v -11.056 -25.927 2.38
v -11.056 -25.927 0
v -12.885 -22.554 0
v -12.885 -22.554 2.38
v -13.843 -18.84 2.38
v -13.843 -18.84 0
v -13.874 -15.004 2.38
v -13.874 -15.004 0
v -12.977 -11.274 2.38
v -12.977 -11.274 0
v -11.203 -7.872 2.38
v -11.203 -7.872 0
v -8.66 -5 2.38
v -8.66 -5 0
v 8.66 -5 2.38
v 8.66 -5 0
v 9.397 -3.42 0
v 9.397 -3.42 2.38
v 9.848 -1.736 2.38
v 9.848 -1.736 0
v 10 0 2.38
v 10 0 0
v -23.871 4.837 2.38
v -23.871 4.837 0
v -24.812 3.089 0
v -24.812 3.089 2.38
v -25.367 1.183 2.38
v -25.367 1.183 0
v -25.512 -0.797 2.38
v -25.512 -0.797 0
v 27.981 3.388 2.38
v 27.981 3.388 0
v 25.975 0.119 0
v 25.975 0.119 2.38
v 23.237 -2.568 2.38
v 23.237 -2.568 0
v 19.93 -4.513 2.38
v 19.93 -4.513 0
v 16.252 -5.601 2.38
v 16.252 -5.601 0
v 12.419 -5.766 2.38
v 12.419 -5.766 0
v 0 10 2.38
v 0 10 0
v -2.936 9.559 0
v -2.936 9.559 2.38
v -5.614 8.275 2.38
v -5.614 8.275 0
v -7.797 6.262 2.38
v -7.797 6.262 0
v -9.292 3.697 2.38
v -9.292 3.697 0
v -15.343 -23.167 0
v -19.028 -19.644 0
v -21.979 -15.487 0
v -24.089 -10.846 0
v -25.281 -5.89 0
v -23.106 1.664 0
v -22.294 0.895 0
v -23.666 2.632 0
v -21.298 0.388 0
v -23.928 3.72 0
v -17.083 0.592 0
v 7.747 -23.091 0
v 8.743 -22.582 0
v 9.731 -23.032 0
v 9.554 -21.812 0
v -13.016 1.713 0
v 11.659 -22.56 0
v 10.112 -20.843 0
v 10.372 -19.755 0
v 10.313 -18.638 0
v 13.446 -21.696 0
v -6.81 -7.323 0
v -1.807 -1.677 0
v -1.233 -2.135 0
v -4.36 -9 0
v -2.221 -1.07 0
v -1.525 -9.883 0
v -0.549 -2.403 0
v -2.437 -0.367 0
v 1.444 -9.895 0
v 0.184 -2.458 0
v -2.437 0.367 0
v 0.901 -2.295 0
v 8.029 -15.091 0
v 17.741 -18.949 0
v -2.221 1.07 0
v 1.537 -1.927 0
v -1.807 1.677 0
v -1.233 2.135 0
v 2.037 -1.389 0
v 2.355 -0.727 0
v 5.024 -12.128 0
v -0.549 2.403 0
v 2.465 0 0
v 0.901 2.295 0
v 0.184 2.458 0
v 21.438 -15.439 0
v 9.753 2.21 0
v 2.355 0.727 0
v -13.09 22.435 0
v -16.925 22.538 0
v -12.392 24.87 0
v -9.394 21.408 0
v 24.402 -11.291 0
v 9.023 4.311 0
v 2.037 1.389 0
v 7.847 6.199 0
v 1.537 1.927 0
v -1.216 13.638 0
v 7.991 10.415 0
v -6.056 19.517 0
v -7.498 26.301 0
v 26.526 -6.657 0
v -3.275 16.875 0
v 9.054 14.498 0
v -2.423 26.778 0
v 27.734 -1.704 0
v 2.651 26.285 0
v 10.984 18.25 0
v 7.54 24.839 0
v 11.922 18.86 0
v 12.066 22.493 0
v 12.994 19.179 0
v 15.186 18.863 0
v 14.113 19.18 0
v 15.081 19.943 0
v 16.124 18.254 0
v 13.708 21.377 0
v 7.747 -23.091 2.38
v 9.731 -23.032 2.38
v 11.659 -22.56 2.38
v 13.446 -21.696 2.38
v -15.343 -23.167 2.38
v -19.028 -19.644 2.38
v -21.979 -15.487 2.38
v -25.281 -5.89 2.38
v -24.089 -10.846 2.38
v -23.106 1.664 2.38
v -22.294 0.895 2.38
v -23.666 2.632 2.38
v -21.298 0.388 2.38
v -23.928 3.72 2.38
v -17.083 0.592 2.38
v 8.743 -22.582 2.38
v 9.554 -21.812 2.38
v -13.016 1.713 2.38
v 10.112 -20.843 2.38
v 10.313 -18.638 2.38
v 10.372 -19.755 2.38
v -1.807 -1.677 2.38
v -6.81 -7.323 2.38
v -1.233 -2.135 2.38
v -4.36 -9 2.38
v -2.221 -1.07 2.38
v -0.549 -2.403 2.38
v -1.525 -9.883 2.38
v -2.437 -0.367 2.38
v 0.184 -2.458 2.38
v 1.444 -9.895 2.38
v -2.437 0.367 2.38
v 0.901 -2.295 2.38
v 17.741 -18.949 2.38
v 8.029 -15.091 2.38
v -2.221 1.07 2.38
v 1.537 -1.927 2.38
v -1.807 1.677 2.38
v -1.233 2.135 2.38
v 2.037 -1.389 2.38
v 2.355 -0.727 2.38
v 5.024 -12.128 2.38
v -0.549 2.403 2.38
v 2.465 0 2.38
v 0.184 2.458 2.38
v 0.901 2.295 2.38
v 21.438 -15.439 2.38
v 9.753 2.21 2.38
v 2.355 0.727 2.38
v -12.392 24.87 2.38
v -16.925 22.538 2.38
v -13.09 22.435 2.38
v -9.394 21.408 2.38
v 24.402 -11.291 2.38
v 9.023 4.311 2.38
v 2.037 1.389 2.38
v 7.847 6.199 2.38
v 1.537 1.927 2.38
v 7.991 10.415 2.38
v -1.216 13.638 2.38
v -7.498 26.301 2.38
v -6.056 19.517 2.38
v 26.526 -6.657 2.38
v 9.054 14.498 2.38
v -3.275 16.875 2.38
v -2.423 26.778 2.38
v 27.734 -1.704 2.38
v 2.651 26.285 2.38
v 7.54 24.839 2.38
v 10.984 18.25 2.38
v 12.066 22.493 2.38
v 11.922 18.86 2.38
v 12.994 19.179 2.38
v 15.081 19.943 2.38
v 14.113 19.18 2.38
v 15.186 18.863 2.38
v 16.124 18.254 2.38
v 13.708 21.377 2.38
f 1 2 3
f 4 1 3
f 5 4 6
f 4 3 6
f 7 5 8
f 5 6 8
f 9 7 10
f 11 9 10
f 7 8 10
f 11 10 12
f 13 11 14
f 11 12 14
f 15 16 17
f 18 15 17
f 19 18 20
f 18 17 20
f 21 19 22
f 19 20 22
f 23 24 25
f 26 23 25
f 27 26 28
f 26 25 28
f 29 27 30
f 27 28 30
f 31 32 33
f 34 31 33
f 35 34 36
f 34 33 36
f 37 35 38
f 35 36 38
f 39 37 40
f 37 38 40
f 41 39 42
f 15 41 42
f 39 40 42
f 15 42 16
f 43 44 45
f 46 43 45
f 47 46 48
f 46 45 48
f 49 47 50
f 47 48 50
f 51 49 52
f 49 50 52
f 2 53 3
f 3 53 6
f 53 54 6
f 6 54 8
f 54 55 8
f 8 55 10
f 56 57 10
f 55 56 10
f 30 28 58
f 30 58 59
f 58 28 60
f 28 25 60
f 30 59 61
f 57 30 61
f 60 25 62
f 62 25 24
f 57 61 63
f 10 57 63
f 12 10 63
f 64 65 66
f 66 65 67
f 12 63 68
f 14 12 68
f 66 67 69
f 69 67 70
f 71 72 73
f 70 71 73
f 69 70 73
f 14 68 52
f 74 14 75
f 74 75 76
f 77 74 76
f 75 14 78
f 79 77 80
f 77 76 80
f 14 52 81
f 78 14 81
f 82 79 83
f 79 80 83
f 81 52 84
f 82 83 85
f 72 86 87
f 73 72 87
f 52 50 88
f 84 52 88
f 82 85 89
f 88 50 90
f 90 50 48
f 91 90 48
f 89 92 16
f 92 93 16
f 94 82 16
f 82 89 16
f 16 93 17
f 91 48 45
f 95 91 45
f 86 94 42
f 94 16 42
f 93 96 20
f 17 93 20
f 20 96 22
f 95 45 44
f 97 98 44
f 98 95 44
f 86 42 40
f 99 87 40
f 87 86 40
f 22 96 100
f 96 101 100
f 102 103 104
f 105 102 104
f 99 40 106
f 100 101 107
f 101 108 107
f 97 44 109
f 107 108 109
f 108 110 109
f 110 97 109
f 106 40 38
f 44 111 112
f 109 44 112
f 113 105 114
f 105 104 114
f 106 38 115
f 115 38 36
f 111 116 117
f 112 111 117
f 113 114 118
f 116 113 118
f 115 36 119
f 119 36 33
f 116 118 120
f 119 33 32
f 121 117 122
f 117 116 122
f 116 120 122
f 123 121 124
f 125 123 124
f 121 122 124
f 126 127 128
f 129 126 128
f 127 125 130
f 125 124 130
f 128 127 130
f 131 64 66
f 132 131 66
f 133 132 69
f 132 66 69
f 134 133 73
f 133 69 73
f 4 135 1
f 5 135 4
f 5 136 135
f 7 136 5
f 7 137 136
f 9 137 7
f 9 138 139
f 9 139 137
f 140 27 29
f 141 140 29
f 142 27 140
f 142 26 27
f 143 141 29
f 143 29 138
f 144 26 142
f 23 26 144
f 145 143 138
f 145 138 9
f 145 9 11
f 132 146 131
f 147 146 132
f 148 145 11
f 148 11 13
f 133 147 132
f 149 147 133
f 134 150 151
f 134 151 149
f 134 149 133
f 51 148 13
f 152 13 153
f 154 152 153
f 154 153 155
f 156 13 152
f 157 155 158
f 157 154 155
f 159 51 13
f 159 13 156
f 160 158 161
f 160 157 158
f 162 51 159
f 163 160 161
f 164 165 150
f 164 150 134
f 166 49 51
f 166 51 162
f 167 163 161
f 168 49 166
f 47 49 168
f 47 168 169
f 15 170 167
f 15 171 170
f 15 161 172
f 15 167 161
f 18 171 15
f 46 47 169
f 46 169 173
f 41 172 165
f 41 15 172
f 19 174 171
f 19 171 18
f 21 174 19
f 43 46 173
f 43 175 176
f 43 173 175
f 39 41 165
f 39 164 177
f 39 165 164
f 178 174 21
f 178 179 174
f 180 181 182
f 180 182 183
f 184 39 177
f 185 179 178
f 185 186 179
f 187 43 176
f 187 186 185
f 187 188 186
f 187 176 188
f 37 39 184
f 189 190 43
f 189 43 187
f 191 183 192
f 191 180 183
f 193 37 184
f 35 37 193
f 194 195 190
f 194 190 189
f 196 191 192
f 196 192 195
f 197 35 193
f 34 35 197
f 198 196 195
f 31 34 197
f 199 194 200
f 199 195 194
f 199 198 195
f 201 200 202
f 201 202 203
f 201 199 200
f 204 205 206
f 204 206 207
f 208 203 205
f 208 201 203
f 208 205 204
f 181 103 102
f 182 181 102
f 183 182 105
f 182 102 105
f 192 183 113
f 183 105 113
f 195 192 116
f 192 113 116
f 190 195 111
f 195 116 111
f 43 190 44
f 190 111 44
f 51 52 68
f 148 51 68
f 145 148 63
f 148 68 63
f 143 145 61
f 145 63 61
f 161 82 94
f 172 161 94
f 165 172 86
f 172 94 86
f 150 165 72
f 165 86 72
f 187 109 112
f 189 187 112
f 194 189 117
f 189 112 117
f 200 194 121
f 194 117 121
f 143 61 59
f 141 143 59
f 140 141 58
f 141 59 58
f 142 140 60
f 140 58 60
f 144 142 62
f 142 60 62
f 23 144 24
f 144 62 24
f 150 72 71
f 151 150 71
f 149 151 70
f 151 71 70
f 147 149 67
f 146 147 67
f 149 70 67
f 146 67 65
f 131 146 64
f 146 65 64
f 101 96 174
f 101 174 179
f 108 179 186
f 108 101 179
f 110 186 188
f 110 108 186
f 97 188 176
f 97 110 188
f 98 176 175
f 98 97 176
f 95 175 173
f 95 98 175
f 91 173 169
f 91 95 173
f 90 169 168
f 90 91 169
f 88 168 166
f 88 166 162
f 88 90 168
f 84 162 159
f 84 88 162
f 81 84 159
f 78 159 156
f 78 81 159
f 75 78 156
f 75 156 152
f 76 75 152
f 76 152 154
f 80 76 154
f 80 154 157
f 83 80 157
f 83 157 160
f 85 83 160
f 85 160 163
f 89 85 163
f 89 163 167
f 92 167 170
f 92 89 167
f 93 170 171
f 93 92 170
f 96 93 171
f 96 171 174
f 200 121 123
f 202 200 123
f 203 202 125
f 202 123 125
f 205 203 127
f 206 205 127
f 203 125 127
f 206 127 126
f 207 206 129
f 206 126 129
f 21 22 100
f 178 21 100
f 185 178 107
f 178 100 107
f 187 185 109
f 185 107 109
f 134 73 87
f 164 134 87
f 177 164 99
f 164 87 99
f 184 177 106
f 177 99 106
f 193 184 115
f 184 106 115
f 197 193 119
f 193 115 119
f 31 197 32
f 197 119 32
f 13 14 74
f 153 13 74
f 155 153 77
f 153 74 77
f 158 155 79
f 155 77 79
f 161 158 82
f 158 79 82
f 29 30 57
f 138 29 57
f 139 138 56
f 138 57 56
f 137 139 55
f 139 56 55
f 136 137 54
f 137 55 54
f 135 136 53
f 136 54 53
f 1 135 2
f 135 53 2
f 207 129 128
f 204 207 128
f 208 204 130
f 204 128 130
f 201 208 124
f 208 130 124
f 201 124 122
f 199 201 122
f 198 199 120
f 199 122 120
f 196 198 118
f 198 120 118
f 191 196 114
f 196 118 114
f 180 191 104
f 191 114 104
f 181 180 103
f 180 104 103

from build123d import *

# Parameters (mm, degrees)
F0_R     = 2.465
F1_DEPTH = 2.38


with BuildPart() as f1:
    # F0 (on Top) → F1 (new body)
    with BuildSketch(Plane.XY):
        with BuildLine():
            ThreePointArc((0, 10), (4.359747, 8.999589), (7.847187, 6.198521))
            ThreePointArc((7.847187, 6.198521), (8.410225, 12.486219), (10.984446, 18.25038))
            ThreePointArc((10.984446, 18.25038), (13.553523, 19.219431), (16.124126, 18.254435))
            ThreePointArc((16.124126, 18.254435), (14.432203, 20.69641), (12.065989, 22.49276))
            ThreePointArc((12.065989, 22.49276), (-2.422788, 26.778203), (-16.925003, 22.538461))
            ThreePointArc((-16.925003, 22.538461), (-6.056439, 19.517047), (0, 10))
        make_face()
        with BuildLine():
            ThreePointArc((-8.660254, -5), (-9.973746, -0.724143), (-9.29167, 3.696602))
            ThreePointArc((-9.29167, 3.696602), (-15.018496, 1.040359), (-21.297516, 0.38762))
            ThreePointArc((-21.297516, 0.38762), (-23.421277, 2.12798), (-23.870867, 4.836685))
            ThreePointArc((-23.870867, 4.836685), (-25.139718, 2.15045), (-25.512296, -0.796927))
            ThreePointArc((-25.512296, -0.796927), (-21.97921, -15.487297), (-11.056378, -25.926713))
            ThreePointArc((-11.056378, -25.926713), (-13.874039, -15.003553), (-8.660254, -5))
        make_face()
        with BuildLine():
            ThreePointArc((27.981381, 3.388252), (19.930478, -4.513494), (8.660254, -5))
            ThreePointArc((8.660254, -5), (5.613999, -8.275446), (1.444483, -9.895123))
            ThreePointArc((1.444483, -9.895123), (6.60827, -13.526578), (10.313069, -18.638))
            ThreePointArc((10.313069, -18.638), (9.867754, -21.347411), (7.746741, -23.09112))
            ThreePointArc((7.746741, -23.09112), (10.707515, -22.84686), (13.446307, -21.695833))
            ThreePointArc((13.446307, -21.695833), (24.401998, -11.290906), (27.981381, 3.388252))
        make_face()
        with BuildLine():
            ThreePointArc((8.660254, -5), (9.659258, -2.58819), (10, 0))
            ThreePointArc((10, 0), (9.446477, 3.280864), (7.847187, 6.198521))
            ThreePointArc((7.847187, 6.198521), (4.359747, 8.999589), (0, 10))
            ThreePointArc((0, 10), (-5.613999, 8.275446), (-9.29167, 3.696602))
            ThreePointArc((-9.29167, 3.696602), (-9.973746, -0.724143), (-8.660254, -5))
            ThreePointArc((-8.660254, -5), (-4.359747, -8.999589), (1.444483, -9.895123))
            ThreePointArc((1.444483, -9.895123), (5.613999, -8.275446), (8.660254, -5))
        make_face()
        Circle(F0_R, mode=Mode.SUBTRACT)
    extrude(amount=F1_DEPTH)


solid = f1.part
